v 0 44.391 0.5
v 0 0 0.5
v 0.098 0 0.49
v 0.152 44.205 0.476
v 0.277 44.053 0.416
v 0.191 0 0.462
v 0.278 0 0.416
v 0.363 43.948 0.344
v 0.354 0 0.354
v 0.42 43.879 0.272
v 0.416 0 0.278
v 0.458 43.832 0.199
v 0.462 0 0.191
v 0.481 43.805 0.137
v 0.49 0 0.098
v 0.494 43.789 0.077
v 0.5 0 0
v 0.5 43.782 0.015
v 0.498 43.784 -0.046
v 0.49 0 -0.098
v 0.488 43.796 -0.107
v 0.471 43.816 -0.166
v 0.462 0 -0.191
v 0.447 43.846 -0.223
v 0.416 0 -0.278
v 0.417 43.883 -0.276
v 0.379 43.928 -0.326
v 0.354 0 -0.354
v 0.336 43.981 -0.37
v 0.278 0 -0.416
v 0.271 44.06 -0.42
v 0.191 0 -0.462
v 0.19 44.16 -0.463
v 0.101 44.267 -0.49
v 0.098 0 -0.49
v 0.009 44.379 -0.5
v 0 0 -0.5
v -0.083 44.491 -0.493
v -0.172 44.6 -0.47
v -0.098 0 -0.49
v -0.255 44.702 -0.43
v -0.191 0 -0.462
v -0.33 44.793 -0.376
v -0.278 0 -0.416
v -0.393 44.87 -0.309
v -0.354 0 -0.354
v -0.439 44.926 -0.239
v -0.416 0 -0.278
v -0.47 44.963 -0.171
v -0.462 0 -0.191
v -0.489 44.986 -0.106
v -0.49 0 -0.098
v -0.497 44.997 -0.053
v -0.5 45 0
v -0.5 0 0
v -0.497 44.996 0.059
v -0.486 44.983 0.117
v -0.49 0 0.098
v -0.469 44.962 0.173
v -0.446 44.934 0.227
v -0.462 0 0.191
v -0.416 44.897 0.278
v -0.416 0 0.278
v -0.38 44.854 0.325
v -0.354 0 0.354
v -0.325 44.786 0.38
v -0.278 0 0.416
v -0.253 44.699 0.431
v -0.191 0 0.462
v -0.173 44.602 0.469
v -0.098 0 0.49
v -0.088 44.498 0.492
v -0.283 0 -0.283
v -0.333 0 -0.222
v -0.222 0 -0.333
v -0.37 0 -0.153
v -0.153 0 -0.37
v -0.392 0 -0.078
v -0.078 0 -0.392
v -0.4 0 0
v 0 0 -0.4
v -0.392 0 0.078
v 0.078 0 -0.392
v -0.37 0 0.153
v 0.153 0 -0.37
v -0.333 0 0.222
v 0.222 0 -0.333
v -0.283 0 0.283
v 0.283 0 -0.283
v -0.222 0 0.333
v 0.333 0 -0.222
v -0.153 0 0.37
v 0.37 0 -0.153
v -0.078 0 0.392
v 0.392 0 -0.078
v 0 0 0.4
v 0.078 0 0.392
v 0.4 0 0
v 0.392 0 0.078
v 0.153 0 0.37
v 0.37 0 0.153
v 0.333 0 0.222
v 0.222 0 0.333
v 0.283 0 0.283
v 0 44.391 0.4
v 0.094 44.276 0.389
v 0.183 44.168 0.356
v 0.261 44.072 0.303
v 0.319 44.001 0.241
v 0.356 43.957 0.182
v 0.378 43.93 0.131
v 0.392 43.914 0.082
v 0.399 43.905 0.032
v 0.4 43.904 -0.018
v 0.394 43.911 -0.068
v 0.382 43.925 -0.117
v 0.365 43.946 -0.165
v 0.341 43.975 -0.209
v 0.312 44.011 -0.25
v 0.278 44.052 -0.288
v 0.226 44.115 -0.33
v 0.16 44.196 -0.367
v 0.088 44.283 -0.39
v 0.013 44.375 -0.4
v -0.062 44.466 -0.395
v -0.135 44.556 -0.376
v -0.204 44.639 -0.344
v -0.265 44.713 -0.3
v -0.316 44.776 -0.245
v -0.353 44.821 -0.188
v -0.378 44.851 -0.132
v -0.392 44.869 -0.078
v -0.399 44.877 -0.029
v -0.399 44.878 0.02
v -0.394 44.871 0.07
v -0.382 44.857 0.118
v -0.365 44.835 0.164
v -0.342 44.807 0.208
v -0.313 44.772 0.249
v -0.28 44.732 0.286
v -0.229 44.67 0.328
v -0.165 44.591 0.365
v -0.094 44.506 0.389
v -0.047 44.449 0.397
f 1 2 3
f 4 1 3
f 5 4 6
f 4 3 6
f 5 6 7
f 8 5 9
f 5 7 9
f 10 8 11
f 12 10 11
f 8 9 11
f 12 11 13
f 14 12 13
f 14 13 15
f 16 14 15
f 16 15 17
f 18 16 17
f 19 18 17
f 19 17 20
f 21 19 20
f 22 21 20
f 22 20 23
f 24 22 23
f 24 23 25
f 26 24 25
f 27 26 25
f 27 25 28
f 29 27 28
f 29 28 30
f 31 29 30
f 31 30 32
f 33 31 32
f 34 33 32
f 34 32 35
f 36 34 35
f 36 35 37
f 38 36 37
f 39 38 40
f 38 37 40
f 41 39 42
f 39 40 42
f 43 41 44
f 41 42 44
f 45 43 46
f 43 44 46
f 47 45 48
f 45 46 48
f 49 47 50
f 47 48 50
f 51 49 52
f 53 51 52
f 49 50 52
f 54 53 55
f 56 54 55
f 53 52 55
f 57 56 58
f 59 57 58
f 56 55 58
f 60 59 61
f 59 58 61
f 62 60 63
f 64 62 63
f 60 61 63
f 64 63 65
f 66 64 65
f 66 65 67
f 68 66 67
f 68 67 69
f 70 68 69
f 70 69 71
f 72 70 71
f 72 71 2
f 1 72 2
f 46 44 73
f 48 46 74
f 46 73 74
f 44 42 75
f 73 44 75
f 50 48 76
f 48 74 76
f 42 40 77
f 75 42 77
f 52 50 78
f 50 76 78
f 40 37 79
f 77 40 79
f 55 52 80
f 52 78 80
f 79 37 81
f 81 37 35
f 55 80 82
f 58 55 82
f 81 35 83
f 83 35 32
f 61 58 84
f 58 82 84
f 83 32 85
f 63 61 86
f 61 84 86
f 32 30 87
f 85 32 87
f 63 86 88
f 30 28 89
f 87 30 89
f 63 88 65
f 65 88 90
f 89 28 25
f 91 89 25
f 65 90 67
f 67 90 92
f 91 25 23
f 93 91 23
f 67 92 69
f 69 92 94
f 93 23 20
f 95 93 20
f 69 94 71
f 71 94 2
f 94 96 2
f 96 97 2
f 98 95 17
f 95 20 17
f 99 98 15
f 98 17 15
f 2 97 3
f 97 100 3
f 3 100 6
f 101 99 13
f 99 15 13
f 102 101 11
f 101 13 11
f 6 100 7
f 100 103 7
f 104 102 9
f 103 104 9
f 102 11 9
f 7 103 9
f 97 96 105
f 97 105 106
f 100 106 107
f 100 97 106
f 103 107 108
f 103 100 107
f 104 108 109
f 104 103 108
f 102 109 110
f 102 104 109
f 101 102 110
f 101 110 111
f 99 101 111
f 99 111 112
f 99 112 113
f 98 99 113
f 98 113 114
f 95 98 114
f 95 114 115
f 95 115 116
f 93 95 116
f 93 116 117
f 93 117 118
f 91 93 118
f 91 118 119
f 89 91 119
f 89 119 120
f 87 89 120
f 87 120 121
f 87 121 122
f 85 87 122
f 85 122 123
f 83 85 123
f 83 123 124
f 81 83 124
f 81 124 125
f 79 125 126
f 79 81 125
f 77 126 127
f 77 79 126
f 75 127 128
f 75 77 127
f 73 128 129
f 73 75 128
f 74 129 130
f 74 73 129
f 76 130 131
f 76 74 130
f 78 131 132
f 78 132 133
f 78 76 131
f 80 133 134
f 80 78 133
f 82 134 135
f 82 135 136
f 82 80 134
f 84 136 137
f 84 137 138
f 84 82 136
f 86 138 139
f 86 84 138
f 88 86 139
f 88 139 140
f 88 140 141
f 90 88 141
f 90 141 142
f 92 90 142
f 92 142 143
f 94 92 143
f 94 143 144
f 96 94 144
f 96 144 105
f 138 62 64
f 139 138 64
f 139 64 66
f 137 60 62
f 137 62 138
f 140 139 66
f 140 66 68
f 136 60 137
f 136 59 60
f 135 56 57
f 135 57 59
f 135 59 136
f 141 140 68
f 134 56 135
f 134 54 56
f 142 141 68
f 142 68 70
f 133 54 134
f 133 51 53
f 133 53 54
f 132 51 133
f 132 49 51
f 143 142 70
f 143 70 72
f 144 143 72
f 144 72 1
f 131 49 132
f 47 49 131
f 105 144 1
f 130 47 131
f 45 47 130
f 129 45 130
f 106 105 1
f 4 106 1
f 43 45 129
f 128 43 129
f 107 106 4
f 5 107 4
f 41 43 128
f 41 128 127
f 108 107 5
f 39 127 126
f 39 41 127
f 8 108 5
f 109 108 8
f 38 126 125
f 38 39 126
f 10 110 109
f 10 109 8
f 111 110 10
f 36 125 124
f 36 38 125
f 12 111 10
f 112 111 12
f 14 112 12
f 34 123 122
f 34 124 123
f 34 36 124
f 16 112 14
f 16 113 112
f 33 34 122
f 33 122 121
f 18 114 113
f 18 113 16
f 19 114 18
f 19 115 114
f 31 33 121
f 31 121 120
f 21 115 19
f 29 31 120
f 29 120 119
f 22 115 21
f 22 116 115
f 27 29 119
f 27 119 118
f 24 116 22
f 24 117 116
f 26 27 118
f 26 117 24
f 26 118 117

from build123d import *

# Parameters (mm, degrees)
SKETCH1_R               = 0.5
EXTRUDE1_DEPTH          = 45
SHELL1_T                = -0.1
CUT_EXTRUDE1_DEPTH      = 45
CUT_EXTRUDE1_DEPTH_BACK = 45


with BuildPart() as part:
    # Sketch1 → Extrude1 (new body)
    with BuildSketch(Plane(origin=(0, 0, 0), x_dir=(1, 0, 0), z_dir=(0, 1, 0))):
        Circle(SKETCH1_R)
    extrude(amount=EXTRUDE1_DEPTH)

    # Shell1
    shell1_openings = [part.faces().sort_by_distance(p)[0] for p in [
        (0, 0, 0),
        (0, 45, 0),
    ]]
    offset(amount=SHELL1_T, openings=shell1_openings, kind=Kind.INTERSECTION)

    # Sketch2 → Cut-Extrude1 (cut, two sides: drawn at the far end of the back side and taken through both)
    with BuildSketch(Plane.XY.offset(-CUT_EXTRUDE1_DEPTH_BACK)):
        Polygon((-0.5, 45), (3.966783564, 39.557315291), (3.966783564, 46.045953815), align=None)
    extrude(amount=CUT_EXTRUDE1_DEPTH + CUT_EXTRUDE1_DEPTH_BACK, mode=Mode.SUBTRACT)


solid = part.part
